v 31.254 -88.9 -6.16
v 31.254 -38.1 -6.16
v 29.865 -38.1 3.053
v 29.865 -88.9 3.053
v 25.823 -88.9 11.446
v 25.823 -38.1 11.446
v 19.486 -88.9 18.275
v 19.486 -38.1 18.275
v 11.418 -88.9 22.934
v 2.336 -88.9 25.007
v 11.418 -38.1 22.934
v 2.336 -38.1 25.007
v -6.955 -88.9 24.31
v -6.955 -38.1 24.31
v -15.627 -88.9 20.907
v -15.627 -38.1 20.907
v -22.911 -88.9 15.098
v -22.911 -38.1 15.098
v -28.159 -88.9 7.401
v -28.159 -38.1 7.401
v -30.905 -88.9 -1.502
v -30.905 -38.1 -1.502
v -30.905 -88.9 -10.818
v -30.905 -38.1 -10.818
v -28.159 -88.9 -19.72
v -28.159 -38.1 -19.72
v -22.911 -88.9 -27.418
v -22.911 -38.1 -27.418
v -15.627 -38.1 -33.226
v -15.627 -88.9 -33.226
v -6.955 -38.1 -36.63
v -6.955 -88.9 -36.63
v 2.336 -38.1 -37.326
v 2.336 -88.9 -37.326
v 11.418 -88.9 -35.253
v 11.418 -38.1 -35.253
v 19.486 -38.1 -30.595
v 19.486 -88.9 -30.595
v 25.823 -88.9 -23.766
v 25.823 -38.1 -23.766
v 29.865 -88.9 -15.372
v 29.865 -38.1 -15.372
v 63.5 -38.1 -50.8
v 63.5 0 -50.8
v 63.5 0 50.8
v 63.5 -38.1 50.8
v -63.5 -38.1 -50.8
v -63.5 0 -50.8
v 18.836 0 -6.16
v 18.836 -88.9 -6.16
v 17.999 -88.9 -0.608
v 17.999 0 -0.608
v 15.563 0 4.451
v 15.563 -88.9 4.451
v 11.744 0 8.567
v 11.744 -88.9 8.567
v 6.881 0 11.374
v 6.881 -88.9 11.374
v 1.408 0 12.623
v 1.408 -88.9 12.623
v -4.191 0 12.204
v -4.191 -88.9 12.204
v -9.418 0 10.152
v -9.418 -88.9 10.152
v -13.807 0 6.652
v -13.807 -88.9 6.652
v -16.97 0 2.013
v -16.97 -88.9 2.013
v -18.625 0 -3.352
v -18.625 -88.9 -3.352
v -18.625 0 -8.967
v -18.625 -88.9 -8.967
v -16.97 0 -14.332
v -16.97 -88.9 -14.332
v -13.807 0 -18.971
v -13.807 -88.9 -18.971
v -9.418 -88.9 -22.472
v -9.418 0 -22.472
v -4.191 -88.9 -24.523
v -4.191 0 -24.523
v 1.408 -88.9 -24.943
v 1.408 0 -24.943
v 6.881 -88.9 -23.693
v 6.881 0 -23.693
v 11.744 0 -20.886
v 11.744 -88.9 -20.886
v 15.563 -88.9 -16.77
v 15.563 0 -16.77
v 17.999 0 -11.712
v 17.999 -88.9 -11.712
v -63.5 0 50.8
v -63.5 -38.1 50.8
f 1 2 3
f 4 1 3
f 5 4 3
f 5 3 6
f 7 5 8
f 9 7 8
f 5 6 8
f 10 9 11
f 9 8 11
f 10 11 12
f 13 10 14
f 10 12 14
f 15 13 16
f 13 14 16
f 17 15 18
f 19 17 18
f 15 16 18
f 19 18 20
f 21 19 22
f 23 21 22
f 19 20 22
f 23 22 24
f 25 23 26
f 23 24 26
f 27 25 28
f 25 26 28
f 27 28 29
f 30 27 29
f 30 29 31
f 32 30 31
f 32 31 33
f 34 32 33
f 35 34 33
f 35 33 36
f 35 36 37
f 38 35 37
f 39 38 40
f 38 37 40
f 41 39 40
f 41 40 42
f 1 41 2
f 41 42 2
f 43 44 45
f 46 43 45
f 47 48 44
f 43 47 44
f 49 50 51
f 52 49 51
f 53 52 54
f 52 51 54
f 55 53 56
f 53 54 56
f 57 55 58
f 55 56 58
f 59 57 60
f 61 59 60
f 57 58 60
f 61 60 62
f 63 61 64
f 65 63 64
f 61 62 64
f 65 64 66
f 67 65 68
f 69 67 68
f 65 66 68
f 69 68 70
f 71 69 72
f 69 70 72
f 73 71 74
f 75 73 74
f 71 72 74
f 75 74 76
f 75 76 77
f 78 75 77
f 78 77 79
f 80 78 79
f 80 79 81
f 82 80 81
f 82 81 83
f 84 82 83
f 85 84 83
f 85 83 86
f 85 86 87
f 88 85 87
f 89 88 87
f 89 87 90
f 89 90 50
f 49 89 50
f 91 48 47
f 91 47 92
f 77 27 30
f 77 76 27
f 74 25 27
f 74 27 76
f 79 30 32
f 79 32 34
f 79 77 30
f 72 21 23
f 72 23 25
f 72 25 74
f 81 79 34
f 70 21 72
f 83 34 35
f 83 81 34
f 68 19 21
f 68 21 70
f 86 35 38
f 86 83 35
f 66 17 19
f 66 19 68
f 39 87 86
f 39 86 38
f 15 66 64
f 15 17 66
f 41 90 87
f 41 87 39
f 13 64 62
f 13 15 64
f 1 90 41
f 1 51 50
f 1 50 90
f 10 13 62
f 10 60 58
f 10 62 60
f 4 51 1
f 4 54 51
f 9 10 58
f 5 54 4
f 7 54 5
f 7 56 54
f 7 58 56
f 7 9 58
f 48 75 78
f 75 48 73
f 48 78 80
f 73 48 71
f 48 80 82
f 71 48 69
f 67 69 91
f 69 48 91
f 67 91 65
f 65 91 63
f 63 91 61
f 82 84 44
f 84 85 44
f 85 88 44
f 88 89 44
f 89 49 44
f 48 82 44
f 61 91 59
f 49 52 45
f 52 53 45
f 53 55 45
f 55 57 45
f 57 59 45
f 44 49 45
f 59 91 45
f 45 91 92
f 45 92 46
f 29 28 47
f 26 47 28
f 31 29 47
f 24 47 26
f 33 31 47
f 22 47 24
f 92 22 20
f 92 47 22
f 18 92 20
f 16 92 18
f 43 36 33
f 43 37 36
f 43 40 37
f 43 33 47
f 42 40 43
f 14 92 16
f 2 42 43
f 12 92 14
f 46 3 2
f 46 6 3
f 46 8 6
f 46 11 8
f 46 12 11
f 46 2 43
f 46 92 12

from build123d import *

# Parameters (mm, degrees)
F0_W     = 127
F0_H     = 101.6
F1_DEPTH = 38.1
F2_R     = 31.253705
F3_DEPTH = 50.8
F4_R     = 18.835615
F5_DEPTH = 88.901


with BuildPart() as f1:
    # F0 (on Front) → F1 (new body)
    with BuildSketch(Plane.XZ):
        Rectangle(F0_W, F0_H)
    extrude(amount=F1_DEPTH)

    # F2 (on face) → F3 (join)
    with BuildSketch(Plane.XZ.offset(38.1)):
        with Locations((0, -6.159689)):
            Circle(F2_R)
    extrude(amount=F3_DEPTH)

    # F4 (on face) → F5 (cut, through all)
    with BuildSketch(Plane.XZ.offset(88.9)):
        with Locations((0, -6.159689)):
            Circle(F4_R)
    extrude(amount=-F5_DEPTH, mode=Mode.SUBTRACT)


solid = f1.part
